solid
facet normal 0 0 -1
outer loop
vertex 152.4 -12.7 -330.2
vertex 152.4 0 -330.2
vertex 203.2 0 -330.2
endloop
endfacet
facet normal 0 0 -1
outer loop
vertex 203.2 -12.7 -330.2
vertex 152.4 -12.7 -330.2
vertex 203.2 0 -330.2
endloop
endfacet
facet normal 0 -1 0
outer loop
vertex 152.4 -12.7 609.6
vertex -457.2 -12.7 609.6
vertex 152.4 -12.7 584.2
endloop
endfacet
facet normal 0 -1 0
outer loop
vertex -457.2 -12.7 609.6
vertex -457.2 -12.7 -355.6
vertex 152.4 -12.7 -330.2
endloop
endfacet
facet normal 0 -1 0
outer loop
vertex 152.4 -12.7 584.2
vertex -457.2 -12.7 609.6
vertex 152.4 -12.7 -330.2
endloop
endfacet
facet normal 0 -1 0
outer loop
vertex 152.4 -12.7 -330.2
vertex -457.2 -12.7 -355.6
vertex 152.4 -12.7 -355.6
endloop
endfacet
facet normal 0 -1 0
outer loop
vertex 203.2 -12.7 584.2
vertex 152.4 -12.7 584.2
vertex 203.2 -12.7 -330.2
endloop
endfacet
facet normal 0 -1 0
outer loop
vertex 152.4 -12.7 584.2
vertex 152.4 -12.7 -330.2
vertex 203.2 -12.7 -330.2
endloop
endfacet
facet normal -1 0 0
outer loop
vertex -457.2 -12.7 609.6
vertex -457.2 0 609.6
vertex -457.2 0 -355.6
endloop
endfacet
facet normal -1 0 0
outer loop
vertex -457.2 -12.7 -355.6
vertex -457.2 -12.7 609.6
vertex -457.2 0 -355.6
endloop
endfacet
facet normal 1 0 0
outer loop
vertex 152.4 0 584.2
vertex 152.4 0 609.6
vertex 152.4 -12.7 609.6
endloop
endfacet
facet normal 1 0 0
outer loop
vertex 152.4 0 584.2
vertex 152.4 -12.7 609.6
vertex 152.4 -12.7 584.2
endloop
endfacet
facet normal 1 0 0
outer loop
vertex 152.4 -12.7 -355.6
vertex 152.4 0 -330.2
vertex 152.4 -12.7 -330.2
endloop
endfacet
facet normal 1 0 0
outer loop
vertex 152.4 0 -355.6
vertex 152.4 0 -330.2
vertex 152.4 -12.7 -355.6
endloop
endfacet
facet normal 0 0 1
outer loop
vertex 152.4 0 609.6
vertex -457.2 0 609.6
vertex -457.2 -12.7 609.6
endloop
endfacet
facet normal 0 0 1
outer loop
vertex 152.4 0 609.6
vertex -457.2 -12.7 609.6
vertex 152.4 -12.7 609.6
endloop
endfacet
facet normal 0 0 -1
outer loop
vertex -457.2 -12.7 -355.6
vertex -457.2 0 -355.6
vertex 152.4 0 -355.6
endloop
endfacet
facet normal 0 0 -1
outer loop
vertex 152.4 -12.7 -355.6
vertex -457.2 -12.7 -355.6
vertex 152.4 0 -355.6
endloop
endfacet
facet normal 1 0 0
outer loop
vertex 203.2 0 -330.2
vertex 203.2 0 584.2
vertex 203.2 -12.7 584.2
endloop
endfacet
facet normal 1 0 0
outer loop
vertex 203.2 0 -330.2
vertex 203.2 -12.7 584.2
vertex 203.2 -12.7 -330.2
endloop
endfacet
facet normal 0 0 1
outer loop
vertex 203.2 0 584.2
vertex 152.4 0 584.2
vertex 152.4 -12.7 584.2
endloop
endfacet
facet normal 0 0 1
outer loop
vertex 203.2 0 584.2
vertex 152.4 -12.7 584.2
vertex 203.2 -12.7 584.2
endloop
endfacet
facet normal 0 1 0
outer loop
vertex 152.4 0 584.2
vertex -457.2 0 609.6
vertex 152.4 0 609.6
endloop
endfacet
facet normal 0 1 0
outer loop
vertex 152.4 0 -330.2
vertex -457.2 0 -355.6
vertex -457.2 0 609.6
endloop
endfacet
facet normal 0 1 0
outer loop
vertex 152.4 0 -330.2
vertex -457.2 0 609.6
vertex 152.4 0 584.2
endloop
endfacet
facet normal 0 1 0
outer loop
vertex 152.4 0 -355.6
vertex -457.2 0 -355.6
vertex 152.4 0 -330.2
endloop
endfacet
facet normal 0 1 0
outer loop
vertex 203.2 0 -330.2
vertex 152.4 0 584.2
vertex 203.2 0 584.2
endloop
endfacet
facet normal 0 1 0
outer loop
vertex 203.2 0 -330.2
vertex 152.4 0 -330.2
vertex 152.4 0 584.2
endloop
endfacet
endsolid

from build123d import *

# Parameters (mm, degrees)
SKETCH3_W           = 914.4
SKETCH3_H           = 1219.2
BOSS_EXTRUDE1_DEPTH = 12.7
SKETCH4_W           = 254
SKETCH4_H           = 965.2
CUT_EXTRUDE1_DEPTH  = 12.7
SKETCH5_W           = 50.8
SKETCH5_H           = 25.4
CUT_EXTRUDE2_DEPTH  = 12.7


with BuildPart() as part:
    # Sketch3 → Boss-Extrude1 (new body)
    with BuildSketch(Plane(origin=(0, 0, 0), x_dir=(1, 0, 0), z_dir=(0, 1, 0))):
        Rectangle(SKETCH3_W, SKETCH3_H)
    extrude(amount=-BOSS_EXTRUDE1_DEPTH)

    # Sketch4 → Cut-Extrude1 (cut)
    with BuildSketch(Plane(origin=(0, 0, 0), x_dir=(1, 0, 0), z_dir=(0, 1, 0))):
        Polygon((-457.2, 609.6), (-457.2, 355.6), (203.2, 355.6), (457.2, 355.6), (457.2, 609.6), align=None)
        with Locations((330.2, -127)):
            Rectangle(SKETCH4_W, SKETCH4_H)
    extrude(amount=-CUT_EXTRUDE1_DEPTH, mode=Mode.SUBTRACT)

    # Sketch5 → Cut-Extrude2 (cut)
    with BuildSketch(Plane(origin=(0, 0, 0), x_dir=(1, 0, 0), z_dir=(0, 1, 0))):
        with Locations((177.8, 342.9)):
            Rectangle(SKETCH5_W, SKETCH5_H)
        with Locations((177.8, -596.9)):
            Rectangle(SKETCH5_W, SKETCH5_H)
    extrude(amount=-CUT_EXTRUDE2_DEPTH, mode=Mode.SUBTRACT)


solid = part.part
